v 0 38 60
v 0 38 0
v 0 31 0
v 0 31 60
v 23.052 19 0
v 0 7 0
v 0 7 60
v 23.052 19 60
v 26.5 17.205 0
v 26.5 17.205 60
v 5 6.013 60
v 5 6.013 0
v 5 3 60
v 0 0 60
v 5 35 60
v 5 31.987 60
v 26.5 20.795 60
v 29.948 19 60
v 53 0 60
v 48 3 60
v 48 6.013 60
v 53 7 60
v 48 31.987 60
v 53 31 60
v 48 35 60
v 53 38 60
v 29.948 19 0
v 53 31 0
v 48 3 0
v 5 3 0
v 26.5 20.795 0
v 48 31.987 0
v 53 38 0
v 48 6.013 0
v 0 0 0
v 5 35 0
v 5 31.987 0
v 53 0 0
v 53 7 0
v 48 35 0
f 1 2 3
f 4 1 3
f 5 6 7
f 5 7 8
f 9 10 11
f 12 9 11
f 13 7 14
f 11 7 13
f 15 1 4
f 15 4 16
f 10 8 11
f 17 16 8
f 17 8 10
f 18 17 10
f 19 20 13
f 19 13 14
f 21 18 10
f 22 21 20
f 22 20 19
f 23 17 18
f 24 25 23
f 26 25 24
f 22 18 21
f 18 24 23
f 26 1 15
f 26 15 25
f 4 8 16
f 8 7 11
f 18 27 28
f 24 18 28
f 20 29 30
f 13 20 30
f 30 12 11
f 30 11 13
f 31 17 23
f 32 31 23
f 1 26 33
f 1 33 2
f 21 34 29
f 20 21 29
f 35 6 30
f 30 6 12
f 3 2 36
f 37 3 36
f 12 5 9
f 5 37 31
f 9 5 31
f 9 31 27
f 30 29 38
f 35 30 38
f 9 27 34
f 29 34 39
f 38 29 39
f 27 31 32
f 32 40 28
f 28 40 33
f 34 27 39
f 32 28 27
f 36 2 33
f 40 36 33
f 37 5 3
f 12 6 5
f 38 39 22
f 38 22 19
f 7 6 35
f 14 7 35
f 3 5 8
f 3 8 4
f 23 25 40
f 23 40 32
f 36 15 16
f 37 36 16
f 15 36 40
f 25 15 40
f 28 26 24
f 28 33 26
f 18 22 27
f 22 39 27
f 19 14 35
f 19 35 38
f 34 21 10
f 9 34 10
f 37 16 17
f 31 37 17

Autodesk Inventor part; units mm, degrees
ref_plane "YZ Plane" through (0, 0, 0) normal (1, 0, 0) x (0, 1, 0)
ref_plane "XZ Plane" through (0, 0, 0) normal (0, 1, 0) x (-1, 0, 0)
ref_plane "XY Plane" through (0, 0, 0) normal (0, 0, 1) x (1, 0, 0)
sketch "Sketch1" plane through (0, 0, 0) normal (0, 0, 1) x (1, 0, 0)
  line L0 (0, 0) -> (53, 0)
  line L1 (53, 0) -> (53, 38) construction
  line L2 (53, 38) -> (0, 38)
  line L3 (0, 38) -> (0, 0) construction
  line L4 (5, 35) -> (48, 35)
  line L5 (48, 3) -> (5, 3)
  line L6 (53, 7) -> (0, 7) construction
  line L7 (0, 31) -> (53, 31) construction
  line L8 (5, 38) -> (5, 0) construction
  line L9 (48, 38) -> (48, 0) construction
  line L10 (0, 31) -> (53, 31) construction
  line L11 (0, 31) -> (53, 31) construction
  line L12 (0, 31) -> (54.1143, 31) construction
  line L13 (53, 7) -> (107.1143, 7) construction
  line L14 (0, 31) -> (53.8717, 31) construction
  line L15 (53, 7) -> (106.8717, 7) construction
  line L16 (0, 31) -> (48, 6.0128) construction
  line L17 (0, 31) -> (54.1143, 31) construction
  line L18 (53, 7) -> (5, 31.9872) construction
  line L19 (53, 7) -> (107.1143, 7) construction
  line L20 (53, 38) -> (53, 31)
  line L21 (0, 38) -> (0, 31)
  line L22 (0, 7) -> (0, 0)
  line L23 (53, 7) -> (53, 0)
  line L24 (0, 7) -> (48, 31.9872) construction
  line L25 (0, 7) -> (54.1143, 7) construction
  line L26 (53, 31) -> (5, 6.0128) construction
  line L27 (53, 31) -> (107.1143, 31) construction
  line L28 (5, 35) -> (5, 31.9872)
  line L29 (48, 35) -> (48, 31.9872)
  line L30 (5, 6.0128) -> (5, 3)
  line L31 (48, 6.0128) -> (48, 3)
  line L32 (5, 31.9872) -> (26.5, 20.795)
  line L33 (48, 6.0128) -> (26.5, 17.205)
  line L34 (23.0518, 19) -> (0, 31)
  line L35 (0, 7) -> (23.0518, 19)
  line L36 (26.5, 20.795) -> (48, 31.9872)
  line L37 (26.5, 17.205) -> (5, 6.0128)
  line L38 (29.9482, 19) -> (53, 31)
  line L39 (53, 7) -> (29.9482, 19)
  dimension "d12" = 53
  dimension "d13" = 38
  dimension "d14" = 3
  dimension "d15" = 3
  dimension "d16" = 4
  dimension "d17" = 4
  dimension "d18" = 5
  dimension "d19" = 5
  dimension "d27" = 27.5
  dimension "d28" = 152.5
  dimension "d29" = 27.5
  dimension "d30" = 152.5
extrude "Extrusion1" add sketch "Sketch1" along normal blind 60
sketch "Sketch2" plane through (53, 0, 0) normal (1, 0, 0) x (0, 0, -1)
  circle A0 centre (-55, 5) radius 1.35
  circle A1 centre (-30, 5) radius 1.35
  circle A2 centre (-5, 5) radius 1.35
  circle A3 centre (-36.465, 33) radius 1.35
  circle A4 centre (-11.465, 33) radius 1.35
  point P0 (0, 0)
  dimension "d33" = 2.7
  dimension "d34" = 2.7
  dimension "d35" = 2.7
  dimension "d36" = 2.7
  dimension "d37" = 2.7
properties part number "legspacer_paula_v2"
